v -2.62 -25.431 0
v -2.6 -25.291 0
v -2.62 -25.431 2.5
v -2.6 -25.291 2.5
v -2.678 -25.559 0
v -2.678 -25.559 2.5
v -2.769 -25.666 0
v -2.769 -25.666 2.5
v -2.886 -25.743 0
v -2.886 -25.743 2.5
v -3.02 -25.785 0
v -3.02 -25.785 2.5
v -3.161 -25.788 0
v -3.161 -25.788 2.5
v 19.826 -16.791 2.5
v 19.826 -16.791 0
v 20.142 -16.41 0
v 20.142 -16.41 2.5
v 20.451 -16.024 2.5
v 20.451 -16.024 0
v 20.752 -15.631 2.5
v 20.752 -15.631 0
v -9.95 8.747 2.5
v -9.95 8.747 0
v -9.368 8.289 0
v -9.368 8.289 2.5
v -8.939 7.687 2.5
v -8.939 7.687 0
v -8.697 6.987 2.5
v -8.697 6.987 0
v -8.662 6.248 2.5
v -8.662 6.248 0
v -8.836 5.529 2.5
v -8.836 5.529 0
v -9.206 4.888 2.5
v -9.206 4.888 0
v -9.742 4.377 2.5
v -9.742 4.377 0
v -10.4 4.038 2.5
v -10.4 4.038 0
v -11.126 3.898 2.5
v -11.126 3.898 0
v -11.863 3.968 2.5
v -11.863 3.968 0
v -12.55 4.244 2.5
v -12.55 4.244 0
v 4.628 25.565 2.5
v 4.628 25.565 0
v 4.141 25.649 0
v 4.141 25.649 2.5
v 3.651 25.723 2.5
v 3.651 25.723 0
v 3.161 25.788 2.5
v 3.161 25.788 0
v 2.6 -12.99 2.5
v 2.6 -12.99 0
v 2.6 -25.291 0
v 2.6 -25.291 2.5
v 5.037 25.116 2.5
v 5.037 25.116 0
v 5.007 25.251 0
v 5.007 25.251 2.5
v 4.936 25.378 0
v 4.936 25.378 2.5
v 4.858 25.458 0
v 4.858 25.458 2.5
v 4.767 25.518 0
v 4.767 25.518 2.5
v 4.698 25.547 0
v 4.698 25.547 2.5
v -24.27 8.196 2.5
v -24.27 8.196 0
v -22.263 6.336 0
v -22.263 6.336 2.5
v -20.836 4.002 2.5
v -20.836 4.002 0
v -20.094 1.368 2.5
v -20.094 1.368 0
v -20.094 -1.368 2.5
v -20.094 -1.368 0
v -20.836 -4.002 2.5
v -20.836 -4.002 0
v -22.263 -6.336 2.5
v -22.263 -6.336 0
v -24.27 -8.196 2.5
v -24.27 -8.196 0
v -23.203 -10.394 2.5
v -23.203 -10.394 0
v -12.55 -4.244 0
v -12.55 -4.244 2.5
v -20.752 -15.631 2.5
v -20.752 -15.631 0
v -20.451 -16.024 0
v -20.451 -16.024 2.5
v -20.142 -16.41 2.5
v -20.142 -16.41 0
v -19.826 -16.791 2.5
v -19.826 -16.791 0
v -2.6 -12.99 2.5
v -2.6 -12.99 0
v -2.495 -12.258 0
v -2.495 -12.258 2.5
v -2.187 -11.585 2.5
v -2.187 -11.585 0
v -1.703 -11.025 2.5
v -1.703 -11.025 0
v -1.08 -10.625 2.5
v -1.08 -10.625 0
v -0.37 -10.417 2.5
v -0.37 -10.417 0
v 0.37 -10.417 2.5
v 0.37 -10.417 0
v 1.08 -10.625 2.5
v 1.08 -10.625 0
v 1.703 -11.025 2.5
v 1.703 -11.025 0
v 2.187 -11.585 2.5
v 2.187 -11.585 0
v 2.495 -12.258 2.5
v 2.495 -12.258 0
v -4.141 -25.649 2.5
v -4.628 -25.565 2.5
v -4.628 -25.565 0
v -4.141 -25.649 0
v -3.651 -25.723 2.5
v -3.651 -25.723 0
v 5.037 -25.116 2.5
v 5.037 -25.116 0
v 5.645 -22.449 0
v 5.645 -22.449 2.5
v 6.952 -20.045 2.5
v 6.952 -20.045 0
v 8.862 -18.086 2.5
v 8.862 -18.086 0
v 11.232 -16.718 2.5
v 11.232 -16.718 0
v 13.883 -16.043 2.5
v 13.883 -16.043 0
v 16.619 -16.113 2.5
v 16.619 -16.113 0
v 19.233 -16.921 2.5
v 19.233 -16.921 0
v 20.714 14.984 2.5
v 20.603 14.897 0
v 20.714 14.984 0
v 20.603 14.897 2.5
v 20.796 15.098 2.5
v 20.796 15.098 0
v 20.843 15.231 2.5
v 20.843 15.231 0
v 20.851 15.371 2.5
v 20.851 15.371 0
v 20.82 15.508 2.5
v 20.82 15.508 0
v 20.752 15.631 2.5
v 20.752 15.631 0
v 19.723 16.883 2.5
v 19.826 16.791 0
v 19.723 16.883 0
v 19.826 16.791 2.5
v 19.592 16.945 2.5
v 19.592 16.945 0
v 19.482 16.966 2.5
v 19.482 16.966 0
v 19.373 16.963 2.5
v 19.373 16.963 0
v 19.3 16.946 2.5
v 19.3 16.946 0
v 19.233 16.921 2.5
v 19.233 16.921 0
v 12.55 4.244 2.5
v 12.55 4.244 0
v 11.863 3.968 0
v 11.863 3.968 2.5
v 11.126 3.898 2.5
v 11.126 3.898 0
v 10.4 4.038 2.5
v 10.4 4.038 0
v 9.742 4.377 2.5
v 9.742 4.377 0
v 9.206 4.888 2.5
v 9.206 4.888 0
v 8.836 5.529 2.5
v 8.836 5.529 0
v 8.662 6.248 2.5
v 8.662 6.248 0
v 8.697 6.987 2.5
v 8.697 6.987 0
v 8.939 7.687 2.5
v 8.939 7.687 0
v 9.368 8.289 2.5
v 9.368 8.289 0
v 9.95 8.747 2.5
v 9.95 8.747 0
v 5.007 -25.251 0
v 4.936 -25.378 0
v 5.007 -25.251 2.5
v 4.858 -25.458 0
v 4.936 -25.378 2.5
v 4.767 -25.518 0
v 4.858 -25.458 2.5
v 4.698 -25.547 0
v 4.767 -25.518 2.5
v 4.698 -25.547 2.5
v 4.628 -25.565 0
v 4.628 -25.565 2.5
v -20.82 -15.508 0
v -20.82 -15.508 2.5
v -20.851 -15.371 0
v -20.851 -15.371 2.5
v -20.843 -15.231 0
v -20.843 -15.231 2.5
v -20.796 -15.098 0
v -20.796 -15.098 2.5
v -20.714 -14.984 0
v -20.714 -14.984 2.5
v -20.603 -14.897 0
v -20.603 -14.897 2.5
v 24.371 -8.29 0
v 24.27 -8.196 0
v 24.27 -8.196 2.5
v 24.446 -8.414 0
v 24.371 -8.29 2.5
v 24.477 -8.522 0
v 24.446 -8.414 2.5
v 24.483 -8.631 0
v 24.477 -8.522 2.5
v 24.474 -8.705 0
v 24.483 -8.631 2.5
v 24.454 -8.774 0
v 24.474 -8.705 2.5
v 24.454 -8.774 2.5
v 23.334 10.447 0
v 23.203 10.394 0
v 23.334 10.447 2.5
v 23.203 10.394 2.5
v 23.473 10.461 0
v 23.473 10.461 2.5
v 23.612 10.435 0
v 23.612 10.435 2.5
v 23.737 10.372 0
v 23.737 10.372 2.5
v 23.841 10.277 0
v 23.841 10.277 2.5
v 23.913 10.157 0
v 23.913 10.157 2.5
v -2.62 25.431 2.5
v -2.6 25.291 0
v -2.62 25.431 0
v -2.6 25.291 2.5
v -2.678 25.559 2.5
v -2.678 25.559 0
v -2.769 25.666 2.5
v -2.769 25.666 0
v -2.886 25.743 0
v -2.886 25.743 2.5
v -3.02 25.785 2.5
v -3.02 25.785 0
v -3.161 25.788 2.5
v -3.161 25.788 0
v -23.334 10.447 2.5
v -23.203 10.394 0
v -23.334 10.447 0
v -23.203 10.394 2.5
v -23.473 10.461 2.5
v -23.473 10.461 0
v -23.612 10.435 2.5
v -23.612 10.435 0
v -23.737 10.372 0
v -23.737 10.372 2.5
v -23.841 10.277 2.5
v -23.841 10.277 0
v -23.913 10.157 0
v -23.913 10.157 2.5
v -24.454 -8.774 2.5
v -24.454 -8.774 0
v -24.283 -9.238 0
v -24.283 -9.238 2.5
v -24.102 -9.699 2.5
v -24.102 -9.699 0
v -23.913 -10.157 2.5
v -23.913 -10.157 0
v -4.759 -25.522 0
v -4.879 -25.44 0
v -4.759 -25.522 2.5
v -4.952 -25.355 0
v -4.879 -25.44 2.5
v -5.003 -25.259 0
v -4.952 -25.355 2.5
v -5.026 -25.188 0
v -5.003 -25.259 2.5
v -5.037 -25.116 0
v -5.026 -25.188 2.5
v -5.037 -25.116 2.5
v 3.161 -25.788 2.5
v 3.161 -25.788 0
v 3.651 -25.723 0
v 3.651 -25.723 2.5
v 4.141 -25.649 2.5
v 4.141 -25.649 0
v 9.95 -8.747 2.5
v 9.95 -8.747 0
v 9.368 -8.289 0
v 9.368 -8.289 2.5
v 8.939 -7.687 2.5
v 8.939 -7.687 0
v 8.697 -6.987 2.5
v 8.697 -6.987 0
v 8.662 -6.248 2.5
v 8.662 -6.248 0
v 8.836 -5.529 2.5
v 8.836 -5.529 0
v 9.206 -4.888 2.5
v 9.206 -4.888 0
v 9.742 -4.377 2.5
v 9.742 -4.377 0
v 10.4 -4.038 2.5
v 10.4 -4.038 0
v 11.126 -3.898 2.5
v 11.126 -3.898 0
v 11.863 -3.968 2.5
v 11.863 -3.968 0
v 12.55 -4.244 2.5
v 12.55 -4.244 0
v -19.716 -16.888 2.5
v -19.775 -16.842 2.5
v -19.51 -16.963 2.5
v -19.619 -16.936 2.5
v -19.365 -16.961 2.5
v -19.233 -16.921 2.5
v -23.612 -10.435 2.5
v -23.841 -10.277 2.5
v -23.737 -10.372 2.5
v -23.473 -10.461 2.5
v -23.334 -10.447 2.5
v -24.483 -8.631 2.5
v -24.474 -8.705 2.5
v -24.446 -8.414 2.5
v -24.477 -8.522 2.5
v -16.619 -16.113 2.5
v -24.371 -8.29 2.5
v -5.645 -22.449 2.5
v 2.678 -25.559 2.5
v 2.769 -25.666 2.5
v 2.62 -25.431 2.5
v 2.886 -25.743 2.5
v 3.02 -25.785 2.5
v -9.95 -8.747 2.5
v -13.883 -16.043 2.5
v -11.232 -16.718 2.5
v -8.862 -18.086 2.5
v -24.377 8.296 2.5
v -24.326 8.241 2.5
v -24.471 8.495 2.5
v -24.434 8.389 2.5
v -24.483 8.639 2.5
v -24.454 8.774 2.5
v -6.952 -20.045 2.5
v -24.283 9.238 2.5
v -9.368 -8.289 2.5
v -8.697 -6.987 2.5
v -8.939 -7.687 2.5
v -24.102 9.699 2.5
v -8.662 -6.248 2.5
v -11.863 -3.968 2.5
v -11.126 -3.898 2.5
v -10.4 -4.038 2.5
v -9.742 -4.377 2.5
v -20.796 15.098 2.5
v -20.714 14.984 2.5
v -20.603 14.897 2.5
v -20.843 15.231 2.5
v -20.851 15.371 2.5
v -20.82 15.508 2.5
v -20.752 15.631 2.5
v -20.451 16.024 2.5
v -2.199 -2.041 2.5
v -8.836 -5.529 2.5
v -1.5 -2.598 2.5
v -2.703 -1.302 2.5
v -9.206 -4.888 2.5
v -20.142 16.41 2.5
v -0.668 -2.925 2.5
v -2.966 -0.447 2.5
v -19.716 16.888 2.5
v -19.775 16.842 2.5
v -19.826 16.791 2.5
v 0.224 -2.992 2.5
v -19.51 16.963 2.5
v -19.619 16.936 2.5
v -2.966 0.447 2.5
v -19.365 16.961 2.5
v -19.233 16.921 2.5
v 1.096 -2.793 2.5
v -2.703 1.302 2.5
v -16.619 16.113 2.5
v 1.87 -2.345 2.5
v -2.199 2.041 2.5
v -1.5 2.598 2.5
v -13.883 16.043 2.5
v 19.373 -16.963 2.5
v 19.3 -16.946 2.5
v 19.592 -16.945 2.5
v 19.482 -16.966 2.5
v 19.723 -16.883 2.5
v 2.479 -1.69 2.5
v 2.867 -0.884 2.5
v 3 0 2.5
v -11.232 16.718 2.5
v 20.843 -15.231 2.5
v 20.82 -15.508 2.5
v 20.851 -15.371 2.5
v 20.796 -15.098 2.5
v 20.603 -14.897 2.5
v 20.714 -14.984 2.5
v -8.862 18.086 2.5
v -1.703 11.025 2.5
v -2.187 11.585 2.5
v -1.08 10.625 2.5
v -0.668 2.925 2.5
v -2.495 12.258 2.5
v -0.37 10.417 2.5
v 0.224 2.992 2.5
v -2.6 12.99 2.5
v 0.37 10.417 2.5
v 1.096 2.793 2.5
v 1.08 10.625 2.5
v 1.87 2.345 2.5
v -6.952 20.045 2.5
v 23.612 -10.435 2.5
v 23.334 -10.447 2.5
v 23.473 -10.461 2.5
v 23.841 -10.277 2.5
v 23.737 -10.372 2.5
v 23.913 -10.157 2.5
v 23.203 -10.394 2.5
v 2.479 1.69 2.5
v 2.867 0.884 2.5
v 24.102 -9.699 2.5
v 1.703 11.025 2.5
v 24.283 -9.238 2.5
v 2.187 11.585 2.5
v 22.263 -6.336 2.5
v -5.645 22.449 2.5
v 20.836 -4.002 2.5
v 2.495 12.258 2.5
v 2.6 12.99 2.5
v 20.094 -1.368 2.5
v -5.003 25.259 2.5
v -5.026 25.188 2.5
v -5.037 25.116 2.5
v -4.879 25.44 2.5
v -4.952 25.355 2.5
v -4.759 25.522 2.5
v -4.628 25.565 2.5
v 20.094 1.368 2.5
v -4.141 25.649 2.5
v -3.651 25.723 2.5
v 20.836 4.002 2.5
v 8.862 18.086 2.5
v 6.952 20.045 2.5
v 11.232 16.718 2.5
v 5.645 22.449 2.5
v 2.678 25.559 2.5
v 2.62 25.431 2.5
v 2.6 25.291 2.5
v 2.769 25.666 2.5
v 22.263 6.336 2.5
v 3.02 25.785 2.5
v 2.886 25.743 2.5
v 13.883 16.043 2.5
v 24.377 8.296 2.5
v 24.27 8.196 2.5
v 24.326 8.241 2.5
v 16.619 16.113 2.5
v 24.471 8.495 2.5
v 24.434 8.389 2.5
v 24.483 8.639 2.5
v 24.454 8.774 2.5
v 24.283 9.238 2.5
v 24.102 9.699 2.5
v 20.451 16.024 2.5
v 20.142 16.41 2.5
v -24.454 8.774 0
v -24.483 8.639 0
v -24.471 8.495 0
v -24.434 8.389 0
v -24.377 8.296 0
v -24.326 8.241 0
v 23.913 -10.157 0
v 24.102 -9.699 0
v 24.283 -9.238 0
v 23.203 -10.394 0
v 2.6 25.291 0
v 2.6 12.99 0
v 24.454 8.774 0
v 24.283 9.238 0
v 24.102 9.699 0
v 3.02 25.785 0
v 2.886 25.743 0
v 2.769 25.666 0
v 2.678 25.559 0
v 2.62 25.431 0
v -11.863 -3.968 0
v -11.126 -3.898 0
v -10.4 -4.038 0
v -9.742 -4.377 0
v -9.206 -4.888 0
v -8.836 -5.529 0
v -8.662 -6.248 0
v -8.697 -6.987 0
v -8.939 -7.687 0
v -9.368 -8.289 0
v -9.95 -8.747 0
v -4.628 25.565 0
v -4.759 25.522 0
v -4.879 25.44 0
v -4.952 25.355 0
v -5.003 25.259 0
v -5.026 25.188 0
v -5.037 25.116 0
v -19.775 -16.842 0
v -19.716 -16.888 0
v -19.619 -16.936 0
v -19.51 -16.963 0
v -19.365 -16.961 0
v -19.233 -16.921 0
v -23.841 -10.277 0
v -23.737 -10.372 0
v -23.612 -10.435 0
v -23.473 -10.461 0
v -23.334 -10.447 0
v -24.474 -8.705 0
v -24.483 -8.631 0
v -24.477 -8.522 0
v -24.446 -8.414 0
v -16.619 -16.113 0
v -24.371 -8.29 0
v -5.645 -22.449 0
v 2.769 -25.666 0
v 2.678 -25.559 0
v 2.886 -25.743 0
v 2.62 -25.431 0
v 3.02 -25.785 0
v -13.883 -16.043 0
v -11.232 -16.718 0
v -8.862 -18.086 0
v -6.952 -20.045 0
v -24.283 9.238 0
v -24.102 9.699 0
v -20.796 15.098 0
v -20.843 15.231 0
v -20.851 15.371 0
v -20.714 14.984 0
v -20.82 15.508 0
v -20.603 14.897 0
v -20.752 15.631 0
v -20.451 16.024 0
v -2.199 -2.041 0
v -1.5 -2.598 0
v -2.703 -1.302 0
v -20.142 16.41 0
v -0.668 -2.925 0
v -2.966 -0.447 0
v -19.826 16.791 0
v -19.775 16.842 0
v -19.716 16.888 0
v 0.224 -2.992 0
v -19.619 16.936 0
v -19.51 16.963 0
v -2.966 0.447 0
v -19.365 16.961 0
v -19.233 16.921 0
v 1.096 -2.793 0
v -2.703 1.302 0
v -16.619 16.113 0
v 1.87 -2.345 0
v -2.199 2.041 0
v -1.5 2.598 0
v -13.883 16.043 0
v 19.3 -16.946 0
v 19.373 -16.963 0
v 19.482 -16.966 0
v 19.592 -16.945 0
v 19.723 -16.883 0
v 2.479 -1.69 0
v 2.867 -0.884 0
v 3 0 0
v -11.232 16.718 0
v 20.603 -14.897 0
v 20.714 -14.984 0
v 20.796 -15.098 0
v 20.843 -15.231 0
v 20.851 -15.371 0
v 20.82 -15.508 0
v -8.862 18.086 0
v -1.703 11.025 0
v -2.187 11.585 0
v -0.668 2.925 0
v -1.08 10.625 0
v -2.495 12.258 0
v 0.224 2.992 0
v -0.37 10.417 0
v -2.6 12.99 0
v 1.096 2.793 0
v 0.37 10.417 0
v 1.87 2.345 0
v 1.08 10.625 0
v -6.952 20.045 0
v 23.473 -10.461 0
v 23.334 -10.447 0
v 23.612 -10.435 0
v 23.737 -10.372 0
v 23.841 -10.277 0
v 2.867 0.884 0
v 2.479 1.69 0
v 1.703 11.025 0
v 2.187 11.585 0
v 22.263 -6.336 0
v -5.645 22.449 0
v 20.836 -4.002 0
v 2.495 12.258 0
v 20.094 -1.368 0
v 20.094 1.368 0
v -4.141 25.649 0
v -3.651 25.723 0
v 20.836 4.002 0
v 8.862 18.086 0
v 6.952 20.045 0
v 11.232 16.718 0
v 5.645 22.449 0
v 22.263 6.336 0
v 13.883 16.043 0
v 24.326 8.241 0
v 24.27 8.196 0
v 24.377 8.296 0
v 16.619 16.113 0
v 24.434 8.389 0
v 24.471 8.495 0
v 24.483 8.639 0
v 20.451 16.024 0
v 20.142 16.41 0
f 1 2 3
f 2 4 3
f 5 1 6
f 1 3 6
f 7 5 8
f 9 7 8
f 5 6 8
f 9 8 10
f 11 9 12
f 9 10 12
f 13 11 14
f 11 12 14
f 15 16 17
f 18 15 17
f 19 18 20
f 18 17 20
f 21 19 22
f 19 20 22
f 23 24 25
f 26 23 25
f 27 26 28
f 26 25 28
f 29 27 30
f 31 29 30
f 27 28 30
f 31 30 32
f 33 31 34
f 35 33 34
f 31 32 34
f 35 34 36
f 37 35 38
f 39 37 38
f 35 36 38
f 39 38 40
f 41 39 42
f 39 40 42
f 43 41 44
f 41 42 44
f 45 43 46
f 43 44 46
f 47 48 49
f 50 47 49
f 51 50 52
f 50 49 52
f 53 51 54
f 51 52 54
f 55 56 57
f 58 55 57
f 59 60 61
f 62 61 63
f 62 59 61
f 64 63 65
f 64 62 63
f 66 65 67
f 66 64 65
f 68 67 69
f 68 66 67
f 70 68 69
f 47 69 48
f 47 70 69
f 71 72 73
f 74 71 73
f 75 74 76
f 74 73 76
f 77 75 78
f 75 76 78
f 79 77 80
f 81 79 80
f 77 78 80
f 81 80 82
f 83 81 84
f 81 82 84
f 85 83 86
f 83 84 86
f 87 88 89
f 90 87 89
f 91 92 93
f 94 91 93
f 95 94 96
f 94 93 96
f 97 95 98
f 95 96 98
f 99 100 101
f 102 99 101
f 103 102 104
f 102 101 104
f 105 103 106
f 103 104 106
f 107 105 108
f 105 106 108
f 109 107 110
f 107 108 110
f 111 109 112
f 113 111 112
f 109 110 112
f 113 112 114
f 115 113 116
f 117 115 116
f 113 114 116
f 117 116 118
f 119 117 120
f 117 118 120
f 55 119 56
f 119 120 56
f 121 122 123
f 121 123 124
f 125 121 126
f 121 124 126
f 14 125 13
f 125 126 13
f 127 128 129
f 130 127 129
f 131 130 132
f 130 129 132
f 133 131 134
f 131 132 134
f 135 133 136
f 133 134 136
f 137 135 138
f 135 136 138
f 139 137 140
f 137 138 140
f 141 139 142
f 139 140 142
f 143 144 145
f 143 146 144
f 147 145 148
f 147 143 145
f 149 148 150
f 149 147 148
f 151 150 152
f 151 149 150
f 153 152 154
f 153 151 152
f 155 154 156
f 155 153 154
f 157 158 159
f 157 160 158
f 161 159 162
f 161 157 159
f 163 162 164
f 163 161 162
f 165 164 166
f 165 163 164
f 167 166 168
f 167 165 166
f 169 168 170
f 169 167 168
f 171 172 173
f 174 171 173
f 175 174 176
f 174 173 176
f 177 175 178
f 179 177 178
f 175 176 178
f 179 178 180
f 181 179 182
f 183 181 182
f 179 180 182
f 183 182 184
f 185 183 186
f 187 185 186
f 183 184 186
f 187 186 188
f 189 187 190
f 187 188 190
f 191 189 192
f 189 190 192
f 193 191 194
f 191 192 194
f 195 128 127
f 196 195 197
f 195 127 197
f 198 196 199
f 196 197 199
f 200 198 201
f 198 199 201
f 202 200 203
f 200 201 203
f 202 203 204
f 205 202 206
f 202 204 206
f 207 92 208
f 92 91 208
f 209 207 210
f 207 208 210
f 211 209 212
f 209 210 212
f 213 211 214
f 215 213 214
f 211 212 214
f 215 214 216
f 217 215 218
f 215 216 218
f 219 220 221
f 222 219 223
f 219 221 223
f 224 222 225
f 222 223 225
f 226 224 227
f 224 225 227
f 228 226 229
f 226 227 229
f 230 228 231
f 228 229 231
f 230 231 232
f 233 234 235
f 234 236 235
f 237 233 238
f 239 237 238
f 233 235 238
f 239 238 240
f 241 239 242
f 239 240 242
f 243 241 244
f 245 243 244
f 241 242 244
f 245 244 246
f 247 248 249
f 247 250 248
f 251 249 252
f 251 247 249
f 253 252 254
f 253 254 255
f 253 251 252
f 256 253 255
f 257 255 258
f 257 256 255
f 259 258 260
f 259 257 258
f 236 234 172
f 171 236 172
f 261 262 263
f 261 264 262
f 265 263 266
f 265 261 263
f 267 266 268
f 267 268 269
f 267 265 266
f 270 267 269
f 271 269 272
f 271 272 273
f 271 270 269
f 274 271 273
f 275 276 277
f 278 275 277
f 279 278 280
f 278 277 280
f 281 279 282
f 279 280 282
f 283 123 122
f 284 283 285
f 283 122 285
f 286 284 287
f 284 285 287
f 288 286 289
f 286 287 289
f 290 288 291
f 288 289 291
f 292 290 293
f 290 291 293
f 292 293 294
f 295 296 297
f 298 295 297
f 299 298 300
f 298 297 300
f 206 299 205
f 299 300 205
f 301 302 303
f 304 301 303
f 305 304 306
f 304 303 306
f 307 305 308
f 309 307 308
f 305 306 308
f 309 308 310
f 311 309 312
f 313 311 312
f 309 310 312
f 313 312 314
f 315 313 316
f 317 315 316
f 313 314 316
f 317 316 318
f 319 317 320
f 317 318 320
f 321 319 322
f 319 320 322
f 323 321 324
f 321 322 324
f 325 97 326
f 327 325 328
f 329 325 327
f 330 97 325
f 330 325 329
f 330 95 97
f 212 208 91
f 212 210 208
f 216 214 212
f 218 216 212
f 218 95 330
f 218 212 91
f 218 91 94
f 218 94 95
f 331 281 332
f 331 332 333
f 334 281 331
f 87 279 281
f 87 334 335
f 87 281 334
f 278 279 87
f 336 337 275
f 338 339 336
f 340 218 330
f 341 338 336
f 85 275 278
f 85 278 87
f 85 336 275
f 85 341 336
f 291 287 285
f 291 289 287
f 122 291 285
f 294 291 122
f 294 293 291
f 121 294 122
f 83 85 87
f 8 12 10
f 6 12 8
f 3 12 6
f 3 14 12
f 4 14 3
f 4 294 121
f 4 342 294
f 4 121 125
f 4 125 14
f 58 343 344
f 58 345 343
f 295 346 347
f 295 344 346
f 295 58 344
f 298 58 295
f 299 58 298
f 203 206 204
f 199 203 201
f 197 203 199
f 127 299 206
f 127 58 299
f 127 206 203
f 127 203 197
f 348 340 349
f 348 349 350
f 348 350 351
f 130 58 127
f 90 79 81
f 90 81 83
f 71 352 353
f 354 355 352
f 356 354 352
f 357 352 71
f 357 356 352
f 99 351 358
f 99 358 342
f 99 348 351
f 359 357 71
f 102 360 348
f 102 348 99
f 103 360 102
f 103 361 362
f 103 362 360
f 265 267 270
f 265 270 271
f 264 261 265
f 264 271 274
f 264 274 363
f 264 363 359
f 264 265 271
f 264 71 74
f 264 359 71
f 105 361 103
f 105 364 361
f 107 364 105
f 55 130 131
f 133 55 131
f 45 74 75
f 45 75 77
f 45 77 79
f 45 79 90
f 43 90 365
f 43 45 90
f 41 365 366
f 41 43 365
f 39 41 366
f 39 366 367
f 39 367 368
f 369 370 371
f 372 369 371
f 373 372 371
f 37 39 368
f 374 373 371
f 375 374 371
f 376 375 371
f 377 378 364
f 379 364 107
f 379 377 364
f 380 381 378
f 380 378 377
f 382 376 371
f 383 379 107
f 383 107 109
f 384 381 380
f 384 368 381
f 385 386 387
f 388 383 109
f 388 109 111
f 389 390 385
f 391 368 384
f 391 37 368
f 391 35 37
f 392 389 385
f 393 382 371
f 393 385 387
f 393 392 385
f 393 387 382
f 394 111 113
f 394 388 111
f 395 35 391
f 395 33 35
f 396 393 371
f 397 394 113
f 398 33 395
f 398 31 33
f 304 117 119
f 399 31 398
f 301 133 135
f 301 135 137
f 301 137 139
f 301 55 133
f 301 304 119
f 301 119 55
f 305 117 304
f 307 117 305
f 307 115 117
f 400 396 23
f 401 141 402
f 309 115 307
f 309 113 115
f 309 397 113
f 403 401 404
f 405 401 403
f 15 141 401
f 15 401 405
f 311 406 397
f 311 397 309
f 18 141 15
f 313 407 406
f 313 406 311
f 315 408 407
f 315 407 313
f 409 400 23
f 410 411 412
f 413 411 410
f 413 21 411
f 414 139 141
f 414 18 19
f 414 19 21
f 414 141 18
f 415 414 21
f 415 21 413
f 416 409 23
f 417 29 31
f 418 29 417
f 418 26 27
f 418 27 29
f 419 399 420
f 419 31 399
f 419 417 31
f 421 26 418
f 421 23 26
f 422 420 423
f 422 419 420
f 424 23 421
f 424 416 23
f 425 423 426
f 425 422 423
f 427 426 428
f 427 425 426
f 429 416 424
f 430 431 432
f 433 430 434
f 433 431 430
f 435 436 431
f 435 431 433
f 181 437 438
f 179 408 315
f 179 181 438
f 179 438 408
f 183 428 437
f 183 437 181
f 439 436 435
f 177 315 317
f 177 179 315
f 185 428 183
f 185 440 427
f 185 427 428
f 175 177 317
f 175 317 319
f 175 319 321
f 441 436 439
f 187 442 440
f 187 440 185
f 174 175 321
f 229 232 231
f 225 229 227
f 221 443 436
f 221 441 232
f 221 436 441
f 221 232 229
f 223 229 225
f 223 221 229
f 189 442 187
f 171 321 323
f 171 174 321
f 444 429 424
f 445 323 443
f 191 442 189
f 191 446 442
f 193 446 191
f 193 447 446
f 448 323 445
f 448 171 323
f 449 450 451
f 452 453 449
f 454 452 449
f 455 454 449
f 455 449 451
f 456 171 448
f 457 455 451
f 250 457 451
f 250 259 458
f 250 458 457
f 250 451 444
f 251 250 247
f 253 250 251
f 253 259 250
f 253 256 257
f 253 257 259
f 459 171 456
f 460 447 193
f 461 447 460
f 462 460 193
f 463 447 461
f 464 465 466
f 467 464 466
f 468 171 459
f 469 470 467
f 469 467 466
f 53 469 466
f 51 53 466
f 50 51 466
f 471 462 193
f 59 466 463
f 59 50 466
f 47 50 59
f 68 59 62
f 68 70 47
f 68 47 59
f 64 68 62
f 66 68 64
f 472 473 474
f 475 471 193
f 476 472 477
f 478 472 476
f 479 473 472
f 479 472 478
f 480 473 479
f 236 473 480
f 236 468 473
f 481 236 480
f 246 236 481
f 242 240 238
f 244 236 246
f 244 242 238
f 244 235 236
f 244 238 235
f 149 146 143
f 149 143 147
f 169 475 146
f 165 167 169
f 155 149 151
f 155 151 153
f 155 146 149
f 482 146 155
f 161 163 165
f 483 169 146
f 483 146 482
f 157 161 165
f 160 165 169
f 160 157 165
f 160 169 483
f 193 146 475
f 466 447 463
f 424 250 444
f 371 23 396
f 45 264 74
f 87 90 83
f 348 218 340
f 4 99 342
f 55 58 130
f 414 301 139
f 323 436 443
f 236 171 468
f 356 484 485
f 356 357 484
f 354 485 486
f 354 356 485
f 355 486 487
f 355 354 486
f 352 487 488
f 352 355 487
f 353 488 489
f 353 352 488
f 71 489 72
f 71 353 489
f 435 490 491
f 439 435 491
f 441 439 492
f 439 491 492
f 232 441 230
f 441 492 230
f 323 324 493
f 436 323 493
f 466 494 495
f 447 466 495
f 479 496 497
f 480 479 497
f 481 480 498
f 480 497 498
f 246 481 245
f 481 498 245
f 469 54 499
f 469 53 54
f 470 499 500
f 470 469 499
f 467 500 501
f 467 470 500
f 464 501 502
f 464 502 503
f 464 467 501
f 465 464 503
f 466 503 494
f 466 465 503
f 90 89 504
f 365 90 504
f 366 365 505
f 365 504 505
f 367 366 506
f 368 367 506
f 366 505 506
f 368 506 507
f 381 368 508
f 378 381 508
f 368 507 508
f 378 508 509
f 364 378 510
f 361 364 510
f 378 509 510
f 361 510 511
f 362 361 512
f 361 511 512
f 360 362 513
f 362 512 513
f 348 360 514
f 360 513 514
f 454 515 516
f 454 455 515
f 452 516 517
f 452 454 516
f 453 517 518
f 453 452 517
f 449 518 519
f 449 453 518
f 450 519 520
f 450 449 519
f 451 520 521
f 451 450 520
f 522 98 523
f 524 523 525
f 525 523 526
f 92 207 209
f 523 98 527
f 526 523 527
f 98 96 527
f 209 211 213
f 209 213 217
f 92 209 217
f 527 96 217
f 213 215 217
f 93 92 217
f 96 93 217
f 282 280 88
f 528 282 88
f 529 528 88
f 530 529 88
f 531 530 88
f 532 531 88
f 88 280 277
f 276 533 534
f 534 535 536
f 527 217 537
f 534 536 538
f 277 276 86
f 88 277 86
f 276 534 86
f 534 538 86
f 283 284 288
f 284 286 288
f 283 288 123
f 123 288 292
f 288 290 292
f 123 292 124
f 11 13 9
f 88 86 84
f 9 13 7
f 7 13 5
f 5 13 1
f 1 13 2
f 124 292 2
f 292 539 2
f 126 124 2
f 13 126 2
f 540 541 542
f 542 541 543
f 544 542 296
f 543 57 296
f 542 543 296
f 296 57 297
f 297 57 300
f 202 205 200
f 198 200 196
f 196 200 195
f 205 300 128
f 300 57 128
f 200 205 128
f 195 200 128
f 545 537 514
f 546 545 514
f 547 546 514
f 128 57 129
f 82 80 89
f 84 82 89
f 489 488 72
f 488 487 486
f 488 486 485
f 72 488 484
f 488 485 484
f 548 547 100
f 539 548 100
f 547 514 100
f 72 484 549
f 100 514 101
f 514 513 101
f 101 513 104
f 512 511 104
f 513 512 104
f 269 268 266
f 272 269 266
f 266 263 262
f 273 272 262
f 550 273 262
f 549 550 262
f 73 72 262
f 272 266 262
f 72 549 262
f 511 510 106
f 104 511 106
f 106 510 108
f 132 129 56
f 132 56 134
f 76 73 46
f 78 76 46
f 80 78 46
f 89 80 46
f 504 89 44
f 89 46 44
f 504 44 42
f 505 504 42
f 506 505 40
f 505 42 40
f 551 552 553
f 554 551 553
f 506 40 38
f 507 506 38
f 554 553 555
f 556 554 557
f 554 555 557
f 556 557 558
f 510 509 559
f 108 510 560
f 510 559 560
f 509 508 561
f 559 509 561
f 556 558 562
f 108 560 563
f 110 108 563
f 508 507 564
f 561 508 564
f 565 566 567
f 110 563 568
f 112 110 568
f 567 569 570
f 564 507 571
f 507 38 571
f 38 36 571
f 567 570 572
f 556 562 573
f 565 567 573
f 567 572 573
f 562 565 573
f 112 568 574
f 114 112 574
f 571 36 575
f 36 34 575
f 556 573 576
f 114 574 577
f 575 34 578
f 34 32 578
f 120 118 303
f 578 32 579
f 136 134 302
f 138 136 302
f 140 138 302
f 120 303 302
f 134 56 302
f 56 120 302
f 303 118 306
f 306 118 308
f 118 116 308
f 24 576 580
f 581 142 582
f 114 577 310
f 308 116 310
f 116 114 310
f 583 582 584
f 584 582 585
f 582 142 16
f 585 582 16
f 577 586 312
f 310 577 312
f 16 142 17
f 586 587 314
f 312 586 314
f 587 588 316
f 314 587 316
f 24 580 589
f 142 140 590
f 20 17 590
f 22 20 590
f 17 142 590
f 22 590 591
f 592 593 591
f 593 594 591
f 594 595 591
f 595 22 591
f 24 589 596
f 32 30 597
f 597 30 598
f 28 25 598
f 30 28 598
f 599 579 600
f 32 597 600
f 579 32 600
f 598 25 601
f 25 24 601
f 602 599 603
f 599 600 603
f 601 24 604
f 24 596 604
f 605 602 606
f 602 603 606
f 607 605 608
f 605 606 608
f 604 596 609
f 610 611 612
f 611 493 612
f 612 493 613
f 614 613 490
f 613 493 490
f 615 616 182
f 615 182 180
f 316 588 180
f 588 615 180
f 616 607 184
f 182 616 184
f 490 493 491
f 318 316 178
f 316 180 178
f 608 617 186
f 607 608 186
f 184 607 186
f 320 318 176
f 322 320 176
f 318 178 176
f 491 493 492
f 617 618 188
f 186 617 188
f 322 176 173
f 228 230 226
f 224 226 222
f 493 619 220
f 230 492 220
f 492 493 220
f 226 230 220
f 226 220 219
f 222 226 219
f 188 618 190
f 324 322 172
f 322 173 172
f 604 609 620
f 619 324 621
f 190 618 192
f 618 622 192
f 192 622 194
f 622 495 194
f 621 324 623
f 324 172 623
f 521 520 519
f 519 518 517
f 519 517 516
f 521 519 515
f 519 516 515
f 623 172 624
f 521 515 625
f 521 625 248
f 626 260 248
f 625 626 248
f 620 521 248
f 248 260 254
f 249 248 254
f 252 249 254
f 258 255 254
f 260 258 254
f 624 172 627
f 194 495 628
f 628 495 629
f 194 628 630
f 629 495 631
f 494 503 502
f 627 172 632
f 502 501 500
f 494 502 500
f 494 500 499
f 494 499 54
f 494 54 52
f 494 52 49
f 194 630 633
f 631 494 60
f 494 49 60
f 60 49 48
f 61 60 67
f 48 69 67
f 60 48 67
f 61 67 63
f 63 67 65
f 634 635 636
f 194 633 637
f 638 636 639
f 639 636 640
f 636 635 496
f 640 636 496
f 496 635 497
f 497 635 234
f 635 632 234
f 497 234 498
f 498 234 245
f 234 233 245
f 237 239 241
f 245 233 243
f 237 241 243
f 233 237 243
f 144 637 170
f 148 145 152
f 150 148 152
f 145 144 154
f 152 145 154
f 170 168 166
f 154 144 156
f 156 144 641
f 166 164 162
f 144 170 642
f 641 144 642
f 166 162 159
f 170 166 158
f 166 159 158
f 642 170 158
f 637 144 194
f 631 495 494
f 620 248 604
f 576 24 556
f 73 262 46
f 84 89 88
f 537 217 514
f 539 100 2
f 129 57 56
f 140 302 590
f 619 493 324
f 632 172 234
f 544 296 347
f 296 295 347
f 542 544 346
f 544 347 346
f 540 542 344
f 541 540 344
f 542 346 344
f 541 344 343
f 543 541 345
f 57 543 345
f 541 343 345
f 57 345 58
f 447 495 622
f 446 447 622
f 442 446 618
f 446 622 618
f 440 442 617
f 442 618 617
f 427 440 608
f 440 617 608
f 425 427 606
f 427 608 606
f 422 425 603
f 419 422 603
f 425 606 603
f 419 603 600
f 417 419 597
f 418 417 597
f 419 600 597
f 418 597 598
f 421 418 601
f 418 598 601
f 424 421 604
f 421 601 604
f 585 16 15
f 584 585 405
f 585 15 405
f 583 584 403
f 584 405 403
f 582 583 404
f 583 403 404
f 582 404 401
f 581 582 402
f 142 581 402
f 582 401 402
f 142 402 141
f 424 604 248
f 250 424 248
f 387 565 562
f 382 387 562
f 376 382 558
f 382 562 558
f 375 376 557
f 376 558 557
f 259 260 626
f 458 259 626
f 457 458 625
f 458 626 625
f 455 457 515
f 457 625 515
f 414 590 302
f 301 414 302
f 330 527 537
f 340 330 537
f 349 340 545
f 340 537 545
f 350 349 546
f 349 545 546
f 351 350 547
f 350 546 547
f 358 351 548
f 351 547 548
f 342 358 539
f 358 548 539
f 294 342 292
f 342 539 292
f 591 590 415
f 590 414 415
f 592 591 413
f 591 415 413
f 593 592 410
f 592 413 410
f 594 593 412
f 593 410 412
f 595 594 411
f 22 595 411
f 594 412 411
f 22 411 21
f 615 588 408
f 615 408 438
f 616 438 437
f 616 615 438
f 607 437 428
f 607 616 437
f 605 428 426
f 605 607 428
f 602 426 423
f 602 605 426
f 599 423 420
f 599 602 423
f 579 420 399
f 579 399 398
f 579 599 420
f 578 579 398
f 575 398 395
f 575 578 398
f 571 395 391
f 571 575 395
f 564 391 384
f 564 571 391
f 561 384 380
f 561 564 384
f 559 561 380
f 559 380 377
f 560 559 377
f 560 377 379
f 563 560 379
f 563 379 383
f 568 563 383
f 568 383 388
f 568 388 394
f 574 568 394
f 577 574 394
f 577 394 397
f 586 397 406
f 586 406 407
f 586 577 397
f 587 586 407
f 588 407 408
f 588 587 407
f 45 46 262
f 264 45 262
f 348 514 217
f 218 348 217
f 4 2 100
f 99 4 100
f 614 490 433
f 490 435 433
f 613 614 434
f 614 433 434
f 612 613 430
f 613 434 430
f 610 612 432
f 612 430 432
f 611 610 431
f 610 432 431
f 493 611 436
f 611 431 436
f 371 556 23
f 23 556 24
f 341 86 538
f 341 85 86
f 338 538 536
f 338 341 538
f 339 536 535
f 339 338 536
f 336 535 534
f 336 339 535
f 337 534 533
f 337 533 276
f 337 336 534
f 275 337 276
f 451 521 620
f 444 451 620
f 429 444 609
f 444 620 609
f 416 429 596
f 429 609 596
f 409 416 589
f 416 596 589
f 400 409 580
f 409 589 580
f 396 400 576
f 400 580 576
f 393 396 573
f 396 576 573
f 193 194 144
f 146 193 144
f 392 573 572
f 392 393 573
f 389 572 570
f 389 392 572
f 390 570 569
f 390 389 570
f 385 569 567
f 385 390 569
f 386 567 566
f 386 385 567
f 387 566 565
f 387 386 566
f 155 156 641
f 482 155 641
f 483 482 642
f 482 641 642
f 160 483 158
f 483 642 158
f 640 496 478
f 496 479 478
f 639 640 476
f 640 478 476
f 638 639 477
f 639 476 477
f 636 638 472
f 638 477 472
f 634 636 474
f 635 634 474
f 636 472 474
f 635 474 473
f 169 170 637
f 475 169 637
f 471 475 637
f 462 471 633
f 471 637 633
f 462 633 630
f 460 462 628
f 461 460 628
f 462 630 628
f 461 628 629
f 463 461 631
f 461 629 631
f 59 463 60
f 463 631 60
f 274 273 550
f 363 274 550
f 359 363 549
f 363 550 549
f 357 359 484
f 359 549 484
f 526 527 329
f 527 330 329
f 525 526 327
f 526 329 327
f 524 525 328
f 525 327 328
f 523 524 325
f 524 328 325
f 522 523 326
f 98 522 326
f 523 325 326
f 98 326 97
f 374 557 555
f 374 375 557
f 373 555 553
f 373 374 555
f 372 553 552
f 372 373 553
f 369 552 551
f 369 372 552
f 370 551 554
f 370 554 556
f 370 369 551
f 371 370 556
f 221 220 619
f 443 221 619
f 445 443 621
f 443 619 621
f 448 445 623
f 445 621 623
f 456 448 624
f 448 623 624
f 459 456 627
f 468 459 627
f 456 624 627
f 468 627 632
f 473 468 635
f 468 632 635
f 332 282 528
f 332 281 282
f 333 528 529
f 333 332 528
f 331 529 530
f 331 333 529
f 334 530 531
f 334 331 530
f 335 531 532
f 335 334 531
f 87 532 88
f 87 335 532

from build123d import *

# Parameters (mm, degrees)
F0_R     = 3
F1_DEPTH = 2.5
F2_R     = 0.5


with BuildPart() as f1:
    # F0 (on Top) → F1 (new body)
    with BuildSketch(Plane.XY):
        with BuildLine():
            Line((9.95, 8.746857), (21.08705, 15.176835))
            ThreePointArc((21.08705, 15.176835), (20.351653, 16.14962), (19.571419, 17.086824))
            ThreePointArc((19.571419, 17.086824), (10, 17.320508), (5.011914, 25.492758))
            ThreePointArc((5.011914, 25.492758), (3.810154, 25.699858), (2.6, 25.850338))
            Line((2.6, 25.850338), (2.6, 12.990381))
            ThreePointArc((2.6, 12.990381), (0, 10.390381), (-2.6, 12.990381))
            Line((-2.6, 12.990381), (-2.6, 25.850338))
            ThreePointArc((-2.6, 25.850338), (-3.810154, 25.699858), (-5.011914, 25.492758))
            ThreePointArc((-5.011914, 25.492758), (-10, 17.320508), (-19.571419, 17.086824))
            ThreePointArc((-19.571419, 17.086824), (-20.351653, 16.14962), (-21.08705, 15.176835))
            Line((-21.08705, 15.176835), (-9.95, 8.746857))
            ThreePointArc((-9.95, 8.746857), (-8.998334, 5.195191), (-12.55, 4.243524))
            Line((-12.55, 4.243524), (-23.68705, 10.673503))
            ThreePointArc((-23.68705, 10.673503), (-24.161807, 9.550239), (-24.583333, 8.405934))
            ThreePointArc((-24.583333, 8.405934), (-20, 0), (-24.583333, -8.405934))
            ThreePointArc((-24.583333, -8.405934), (-24.161807, -9.550239), (-23.68705, -10.673503))
            Line((-23.68705, -10.673503), (-12.55, -4.243524))
            ThreePointArc((-12.55, -4.243524), (-8.998334, -5.195191), (-9.95, -8.746857))
            Line((-9.95, -8.746857), (-21.08705, -15.176835))
            ThreePointArc((-21.08705, -15.176835), (-20.351653, -16.14962), (-19.571419, -17.086824))
            ThreePointArc((-19.571419, -17.086824), (-10, -17.320508), (-5.011914, -25.492758))
            ThreePointArc((-5.011914, -25.492758), (-3.810154, -25.699858), (-2.6, -25.850338))
            Line((-2.6, -25.850338), (-2.6, -12.990381))
            ThreePointArc((-2.6, -12.990381), (0, -10.390381), (2.6, -12.990381))
            Line((2.6, -12.990381), (2.6, -25.850338))
            ThreePointArc((2.6, -25.850338), (3.810154, -25.699858), (5.011914, -25.492758))
            ThreePointArc((5.011914, -25.492758), (10, -17.320508), (19.571419, -17.086824))
            ThreePointArc((19.571419, -17.086824), (20.351653, -16.14962), (21.08705, -15.176835))
            Line((21.08705, -15.176835), (9.95, -8.746857))
            ThreePointArc((9.95, -8.746857), (8.998334, -5.195191), (12.55, -4.243524))
            Line((12.55, -4.243524), (23.68705, -10.673503))
            ThreePointArc((23.68705, -10.673503), (24.161807, -9.550239), (24.583333, -8.405934))
            ThreePointArc((24.583333, -8.405934), (20, 0), (24.583333, 8.405934))
            ThreePointArc((24.583333, 8.405934), (24.161807, 9.550239), (23.68705, 10.673503))
            Line((23.68705, 10.673503), (12.55, 4.243524))
            ThreePointArc((12.55, 4.243524), (8.998334, 5.195191), (9.95, 8.746857))
        make_face()
        Circle(F0_R, mode=Mode.SUBTRACT)
    extrude(amount=F1_DEPTH)

    # F2
    f2_edges = [f1.edges().sort_by_distance(p)[0] for p in [
        (23.68705, -10.673503, 1.25),
        (21.08705, -15.176835, 1.25),
        (24.583333, -8.405934, 1.25),
        (19.571419, -17.086824, 1.25),
        (5.011914, -25.492758, 1.25),
        (2.6, -25.850338, 1.25),
        (-2.6, -25.850338, 1.25),
        (-5.011914, -25.492758, 1.25),
        (-21.08705, -15.176835, 1.25),
        (-19.571419, -17.086824, 1.25),
        (-23.68705, -10.673503, 1.25),
        (-24.583333, -8.405934, 1.25),
        (-23.68705, 10.673503, 1.25),
        (-24.583333, 8.405934, 1.25),
        (-21.08705, 15.176835, 1.25),
        (-19.571419, 17.086824, 1.25),
        (-5.011914, 25.492758, 1.25),
        (-2.6, 25.850338, 1.25),
        (2.6, 25.850338, 1.25),
        (5.011914, 25.492758, 1.25),
        (21.08705, 15.176835, 1.25),
        (19.571419, 17.086824, 1.25),
        (23.68705, 10.673503, 1.25),
        (24.583333, 8.405934, 1.25),
    ]]
    fillet(f2_edges, radius=F2_R)


solid = f1.part
